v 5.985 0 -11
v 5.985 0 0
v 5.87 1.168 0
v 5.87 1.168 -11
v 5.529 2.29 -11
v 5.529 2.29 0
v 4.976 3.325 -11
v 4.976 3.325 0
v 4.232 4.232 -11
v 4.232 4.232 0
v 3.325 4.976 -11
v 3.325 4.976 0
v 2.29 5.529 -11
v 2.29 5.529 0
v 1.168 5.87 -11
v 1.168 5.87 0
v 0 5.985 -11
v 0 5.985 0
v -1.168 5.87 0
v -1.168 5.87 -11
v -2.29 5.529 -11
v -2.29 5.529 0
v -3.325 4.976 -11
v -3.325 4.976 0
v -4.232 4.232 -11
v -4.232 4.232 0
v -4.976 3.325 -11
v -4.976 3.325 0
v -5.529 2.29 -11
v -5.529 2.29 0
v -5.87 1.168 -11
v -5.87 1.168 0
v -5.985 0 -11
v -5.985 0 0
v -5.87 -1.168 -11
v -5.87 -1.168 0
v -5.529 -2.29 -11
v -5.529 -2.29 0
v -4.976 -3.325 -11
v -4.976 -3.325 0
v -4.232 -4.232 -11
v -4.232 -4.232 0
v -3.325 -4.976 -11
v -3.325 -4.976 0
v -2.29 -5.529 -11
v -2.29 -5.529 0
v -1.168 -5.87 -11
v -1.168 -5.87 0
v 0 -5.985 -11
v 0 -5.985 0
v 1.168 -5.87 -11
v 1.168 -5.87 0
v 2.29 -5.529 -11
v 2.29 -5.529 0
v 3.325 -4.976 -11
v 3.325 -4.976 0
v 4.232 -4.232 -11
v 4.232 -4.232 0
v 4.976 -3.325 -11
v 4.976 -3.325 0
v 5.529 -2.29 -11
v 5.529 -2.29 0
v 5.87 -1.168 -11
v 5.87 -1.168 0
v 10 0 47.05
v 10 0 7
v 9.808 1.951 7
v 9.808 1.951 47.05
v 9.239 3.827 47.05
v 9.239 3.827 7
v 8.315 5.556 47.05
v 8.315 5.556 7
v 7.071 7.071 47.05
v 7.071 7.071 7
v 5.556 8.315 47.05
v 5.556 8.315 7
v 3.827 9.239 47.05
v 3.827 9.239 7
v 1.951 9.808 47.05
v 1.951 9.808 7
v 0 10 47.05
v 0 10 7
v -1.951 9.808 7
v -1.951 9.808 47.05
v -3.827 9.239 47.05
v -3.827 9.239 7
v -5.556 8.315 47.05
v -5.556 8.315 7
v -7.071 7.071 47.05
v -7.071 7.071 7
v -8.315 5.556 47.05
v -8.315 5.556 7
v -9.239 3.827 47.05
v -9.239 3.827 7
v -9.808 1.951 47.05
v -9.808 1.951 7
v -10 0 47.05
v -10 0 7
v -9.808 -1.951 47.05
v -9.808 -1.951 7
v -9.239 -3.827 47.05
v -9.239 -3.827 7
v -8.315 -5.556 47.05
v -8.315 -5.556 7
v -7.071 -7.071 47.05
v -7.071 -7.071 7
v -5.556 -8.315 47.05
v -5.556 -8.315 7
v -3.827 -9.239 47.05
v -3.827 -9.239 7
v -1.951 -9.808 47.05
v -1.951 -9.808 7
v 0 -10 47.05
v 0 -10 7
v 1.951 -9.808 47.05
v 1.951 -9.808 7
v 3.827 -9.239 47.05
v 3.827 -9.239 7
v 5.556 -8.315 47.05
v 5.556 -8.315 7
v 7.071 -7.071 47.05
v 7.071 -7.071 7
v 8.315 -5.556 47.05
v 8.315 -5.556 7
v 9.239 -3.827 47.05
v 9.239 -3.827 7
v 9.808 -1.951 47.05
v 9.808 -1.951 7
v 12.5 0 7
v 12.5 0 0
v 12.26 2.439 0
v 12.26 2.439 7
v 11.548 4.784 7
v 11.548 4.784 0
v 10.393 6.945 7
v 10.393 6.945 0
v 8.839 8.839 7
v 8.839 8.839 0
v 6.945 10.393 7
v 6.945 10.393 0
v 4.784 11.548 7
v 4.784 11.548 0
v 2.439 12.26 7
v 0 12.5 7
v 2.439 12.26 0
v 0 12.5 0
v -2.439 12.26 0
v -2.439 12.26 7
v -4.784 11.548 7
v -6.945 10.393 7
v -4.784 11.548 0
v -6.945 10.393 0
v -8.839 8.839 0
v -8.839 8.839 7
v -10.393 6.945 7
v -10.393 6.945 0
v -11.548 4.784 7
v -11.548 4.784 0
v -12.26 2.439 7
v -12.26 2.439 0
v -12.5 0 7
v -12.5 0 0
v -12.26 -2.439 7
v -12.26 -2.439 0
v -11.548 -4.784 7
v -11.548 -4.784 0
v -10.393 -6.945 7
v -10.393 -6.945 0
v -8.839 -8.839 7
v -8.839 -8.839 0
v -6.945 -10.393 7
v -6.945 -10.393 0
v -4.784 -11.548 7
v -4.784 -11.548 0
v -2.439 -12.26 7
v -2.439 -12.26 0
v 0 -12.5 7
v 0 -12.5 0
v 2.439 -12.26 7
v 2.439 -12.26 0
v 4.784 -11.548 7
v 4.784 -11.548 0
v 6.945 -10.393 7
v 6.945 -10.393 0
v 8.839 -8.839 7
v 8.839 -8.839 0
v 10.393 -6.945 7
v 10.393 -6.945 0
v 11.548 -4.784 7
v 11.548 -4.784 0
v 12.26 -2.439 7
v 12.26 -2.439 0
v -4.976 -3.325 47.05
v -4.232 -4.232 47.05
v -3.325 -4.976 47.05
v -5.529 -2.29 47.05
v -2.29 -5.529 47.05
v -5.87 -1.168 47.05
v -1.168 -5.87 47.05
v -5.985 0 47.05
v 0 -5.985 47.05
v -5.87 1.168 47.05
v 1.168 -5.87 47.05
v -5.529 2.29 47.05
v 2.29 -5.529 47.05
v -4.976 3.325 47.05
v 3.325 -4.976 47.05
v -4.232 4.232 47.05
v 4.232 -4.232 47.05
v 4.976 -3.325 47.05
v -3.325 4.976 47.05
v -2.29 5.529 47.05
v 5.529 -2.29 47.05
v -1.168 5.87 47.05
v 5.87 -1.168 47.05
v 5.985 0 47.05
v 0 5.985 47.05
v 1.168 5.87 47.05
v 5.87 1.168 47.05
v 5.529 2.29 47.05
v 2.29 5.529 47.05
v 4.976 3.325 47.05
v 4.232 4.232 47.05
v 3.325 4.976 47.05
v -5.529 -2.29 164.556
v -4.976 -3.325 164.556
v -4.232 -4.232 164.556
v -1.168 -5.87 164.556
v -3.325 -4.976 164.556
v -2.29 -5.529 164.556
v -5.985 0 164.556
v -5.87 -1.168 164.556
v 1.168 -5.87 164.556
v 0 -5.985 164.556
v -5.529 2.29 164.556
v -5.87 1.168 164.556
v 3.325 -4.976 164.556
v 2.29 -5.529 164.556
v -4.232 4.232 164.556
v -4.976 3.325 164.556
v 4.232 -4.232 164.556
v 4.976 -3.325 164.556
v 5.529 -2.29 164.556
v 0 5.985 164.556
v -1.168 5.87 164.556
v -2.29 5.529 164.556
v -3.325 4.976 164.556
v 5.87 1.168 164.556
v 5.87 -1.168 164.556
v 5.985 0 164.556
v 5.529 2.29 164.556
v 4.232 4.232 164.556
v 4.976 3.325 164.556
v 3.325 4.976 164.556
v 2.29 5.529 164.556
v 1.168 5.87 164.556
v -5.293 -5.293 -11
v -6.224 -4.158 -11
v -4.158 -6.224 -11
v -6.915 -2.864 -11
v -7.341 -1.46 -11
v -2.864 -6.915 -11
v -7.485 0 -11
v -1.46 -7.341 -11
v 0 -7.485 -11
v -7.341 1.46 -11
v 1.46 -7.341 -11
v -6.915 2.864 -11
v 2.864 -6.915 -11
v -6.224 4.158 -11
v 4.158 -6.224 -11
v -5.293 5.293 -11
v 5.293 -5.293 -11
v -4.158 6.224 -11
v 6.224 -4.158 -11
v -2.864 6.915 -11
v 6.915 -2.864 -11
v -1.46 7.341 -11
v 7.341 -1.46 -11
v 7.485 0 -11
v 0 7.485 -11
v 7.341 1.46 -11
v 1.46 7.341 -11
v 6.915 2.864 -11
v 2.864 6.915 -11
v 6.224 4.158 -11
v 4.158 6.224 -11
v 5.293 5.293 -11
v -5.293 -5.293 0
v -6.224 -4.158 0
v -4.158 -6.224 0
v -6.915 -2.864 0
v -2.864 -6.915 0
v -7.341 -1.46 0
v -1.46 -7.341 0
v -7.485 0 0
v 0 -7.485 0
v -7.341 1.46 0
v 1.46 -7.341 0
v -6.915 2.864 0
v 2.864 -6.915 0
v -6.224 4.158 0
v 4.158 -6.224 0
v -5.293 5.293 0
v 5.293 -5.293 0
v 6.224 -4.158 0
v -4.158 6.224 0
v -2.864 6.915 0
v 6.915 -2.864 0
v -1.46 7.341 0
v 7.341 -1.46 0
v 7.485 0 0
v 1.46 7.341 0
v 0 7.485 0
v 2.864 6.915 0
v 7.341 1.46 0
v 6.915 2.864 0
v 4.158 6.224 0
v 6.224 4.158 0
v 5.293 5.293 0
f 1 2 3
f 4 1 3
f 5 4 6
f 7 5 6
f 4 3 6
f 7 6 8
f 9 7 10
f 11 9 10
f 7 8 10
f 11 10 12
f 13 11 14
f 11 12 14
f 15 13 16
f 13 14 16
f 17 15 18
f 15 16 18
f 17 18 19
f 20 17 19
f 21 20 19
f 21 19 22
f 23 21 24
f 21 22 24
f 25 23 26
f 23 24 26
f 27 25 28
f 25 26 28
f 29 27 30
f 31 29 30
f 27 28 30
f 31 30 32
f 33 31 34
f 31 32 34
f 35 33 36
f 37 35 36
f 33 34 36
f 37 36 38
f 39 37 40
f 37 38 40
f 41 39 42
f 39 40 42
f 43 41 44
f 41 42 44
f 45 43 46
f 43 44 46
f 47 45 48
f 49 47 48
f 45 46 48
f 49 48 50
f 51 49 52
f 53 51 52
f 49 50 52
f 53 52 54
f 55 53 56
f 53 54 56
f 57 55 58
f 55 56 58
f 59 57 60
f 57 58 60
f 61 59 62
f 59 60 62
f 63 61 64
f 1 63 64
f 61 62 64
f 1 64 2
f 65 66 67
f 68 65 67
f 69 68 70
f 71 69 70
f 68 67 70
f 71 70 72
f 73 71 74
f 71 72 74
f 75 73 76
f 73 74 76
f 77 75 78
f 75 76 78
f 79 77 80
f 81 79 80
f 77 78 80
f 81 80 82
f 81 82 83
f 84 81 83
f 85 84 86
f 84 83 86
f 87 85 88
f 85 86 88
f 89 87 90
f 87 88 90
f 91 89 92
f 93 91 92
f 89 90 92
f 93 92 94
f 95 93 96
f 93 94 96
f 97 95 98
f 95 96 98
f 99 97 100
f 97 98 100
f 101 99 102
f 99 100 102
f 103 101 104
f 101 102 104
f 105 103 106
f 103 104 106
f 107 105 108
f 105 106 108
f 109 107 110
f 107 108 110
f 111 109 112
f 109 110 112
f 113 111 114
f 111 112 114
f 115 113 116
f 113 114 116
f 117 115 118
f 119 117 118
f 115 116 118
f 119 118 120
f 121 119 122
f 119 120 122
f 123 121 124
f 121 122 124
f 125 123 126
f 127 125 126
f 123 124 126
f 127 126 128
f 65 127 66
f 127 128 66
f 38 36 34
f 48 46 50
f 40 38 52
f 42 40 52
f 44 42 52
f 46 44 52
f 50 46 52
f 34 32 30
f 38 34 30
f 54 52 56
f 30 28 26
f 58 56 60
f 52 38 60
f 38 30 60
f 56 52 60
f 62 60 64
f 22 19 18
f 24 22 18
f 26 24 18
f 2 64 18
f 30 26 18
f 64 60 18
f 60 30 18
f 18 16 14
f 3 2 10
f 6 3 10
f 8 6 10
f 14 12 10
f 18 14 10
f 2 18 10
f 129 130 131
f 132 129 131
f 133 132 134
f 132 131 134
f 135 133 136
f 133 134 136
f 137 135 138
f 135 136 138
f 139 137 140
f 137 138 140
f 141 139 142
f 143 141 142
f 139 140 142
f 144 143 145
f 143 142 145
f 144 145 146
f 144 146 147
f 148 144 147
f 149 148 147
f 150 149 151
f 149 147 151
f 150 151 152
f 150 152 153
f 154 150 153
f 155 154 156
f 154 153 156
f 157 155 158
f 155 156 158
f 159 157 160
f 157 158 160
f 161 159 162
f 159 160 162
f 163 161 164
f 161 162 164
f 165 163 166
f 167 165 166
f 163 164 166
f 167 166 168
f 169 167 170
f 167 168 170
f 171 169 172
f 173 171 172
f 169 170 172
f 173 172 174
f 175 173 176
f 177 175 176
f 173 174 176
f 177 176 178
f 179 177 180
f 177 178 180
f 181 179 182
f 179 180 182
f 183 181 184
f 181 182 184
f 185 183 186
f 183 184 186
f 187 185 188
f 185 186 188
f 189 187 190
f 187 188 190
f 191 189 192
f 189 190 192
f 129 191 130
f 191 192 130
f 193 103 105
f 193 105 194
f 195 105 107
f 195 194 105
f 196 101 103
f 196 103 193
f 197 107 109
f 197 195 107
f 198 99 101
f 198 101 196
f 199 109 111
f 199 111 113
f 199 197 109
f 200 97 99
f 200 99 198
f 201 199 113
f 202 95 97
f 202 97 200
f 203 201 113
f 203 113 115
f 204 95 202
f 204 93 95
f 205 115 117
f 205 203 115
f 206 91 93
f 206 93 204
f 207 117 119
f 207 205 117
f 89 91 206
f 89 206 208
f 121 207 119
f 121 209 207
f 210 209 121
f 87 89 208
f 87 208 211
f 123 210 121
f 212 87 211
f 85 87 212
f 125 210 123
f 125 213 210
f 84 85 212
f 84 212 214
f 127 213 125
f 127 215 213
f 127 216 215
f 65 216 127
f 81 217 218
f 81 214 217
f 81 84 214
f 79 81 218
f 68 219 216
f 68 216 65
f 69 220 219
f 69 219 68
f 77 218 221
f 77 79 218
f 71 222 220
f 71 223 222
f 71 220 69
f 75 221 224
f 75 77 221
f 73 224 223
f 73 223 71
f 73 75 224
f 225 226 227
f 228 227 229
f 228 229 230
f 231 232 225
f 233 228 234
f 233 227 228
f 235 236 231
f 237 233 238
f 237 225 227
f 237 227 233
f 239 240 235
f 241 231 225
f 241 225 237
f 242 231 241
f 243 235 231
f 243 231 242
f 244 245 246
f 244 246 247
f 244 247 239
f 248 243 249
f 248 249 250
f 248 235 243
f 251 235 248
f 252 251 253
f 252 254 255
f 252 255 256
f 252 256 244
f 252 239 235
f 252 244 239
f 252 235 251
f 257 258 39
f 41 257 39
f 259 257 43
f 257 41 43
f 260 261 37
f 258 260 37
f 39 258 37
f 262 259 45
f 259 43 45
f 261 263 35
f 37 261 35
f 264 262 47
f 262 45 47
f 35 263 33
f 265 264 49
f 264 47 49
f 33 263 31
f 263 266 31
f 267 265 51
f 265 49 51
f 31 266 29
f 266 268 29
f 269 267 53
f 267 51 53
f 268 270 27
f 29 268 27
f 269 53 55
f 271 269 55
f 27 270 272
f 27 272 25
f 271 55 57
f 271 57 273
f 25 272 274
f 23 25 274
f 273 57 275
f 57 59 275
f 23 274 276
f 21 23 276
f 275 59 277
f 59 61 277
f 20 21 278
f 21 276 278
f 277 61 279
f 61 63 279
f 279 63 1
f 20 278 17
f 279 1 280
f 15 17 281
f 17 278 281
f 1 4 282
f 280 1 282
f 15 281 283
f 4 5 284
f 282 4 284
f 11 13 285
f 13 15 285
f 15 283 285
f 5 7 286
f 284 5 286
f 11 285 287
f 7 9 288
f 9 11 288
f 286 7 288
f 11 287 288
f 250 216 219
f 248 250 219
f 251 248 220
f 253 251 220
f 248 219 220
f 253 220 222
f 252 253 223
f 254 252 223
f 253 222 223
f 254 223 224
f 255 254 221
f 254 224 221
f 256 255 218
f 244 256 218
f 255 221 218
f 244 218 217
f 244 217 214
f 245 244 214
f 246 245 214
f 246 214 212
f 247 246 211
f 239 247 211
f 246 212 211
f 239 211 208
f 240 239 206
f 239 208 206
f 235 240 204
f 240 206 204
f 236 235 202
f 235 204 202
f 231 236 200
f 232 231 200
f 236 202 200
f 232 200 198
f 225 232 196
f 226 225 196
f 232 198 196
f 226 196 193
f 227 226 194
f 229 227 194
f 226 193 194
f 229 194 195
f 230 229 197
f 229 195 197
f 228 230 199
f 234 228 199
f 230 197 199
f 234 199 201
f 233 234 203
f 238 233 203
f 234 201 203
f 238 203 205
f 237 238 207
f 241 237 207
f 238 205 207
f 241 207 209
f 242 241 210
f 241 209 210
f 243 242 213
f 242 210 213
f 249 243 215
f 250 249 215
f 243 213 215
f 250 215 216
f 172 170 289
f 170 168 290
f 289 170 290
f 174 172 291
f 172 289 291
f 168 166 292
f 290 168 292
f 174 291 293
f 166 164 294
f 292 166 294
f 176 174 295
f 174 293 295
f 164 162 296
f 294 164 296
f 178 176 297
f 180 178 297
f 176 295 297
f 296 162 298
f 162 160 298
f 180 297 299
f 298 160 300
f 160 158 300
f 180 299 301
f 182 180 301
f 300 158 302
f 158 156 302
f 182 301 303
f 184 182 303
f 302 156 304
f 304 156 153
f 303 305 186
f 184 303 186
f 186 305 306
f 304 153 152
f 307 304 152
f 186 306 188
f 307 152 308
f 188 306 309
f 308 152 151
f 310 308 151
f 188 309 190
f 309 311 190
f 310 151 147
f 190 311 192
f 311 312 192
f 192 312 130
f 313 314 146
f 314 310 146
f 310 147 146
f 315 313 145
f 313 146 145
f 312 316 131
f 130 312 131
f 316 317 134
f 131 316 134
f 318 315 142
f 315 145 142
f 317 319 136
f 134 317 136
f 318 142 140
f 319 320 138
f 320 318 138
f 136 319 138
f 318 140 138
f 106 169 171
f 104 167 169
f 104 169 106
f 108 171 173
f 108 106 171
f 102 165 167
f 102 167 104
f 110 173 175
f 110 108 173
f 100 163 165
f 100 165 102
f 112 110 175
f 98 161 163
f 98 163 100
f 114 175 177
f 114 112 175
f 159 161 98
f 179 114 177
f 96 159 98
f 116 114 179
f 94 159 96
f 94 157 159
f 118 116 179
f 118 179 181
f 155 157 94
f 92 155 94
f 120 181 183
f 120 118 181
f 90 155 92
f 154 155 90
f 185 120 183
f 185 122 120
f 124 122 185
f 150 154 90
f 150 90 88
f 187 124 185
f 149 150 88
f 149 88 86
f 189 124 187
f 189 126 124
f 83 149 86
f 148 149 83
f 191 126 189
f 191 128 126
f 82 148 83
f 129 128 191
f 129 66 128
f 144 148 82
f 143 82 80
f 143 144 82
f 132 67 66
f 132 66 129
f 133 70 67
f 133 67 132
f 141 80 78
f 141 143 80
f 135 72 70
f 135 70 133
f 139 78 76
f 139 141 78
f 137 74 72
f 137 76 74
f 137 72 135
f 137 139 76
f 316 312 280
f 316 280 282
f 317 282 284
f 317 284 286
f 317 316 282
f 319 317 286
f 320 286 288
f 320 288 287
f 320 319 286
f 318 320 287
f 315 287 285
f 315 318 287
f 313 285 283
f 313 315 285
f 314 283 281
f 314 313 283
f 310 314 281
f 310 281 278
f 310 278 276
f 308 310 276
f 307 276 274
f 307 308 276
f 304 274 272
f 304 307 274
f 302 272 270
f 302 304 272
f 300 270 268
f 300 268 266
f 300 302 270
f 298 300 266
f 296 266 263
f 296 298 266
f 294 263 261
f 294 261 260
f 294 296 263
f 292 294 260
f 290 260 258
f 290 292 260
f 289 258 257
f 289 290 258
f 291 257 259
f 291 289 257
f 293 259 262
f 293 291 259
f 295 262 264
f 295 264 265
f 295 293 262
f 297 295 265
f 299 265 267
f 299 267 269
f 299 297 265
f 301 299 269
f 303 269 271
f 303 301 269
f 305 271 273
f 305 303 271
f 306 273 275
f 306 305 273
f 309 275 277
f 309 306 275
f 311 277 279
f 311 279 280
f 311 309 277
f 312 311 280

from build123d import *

# Parameters (mm, degrees)
F0_R      = 7.485
F0_R_2    = 5.985
F1_DEPTH  = 11
F2_R      = 7.485
F2_R_2    = 5.985
F3_DEPTH  = 7
F2_R_3    = 12.5
F4_DEPTH  = 7
F5_R      = 10
F6_DEPTH  = 40.05
F9_R      = 5.985
F10_DEPTH = 117.5055425


# Not quite as in the source:
# - an extrude ends at something that could not be found from the text; its depth is read off the source's solid
# - the program builds the solid bodies; features that only make, move or delete a surface that nothing else refers to are left out


with BuildPart() as f1:
    # F0 (on Top) → F1 (new body)
    with BuildSketch(Plane.XY):
        Circle(F0_R)
        Circle(F0_R_2, mode=Mode.SUBTRACT)
    extrude(amount=-F1_DEPTH)

    # F2 (on face) → F3 (join)
    with BuildSketch(Plane.XY):
        Circle(F2_R)
        Circle(F2_R_2, mode=Mode.SUBTRACT)
    extrude(amount=F3_DEPTH)

    # F2 (on face) → F4 (join)
    with BuildSketch(Plane.XY):
        Circle(F2_R_3)
    extrude(amount=F4_DEPTH)

    # F5 (on face) → F6 (join)
    with BuildSketch(Plane.XY.offset(7)):
        Circle(F5_R)
    extrude(amount=F6_DEPTH)

    # F9 (on face) → F10 (join, through all)
    with BuildSketch(Plane.XY.offset(47.05)):
        Circle(F9_R)
    extrude(amount=F10_DEPTH)


solid = f1.part
